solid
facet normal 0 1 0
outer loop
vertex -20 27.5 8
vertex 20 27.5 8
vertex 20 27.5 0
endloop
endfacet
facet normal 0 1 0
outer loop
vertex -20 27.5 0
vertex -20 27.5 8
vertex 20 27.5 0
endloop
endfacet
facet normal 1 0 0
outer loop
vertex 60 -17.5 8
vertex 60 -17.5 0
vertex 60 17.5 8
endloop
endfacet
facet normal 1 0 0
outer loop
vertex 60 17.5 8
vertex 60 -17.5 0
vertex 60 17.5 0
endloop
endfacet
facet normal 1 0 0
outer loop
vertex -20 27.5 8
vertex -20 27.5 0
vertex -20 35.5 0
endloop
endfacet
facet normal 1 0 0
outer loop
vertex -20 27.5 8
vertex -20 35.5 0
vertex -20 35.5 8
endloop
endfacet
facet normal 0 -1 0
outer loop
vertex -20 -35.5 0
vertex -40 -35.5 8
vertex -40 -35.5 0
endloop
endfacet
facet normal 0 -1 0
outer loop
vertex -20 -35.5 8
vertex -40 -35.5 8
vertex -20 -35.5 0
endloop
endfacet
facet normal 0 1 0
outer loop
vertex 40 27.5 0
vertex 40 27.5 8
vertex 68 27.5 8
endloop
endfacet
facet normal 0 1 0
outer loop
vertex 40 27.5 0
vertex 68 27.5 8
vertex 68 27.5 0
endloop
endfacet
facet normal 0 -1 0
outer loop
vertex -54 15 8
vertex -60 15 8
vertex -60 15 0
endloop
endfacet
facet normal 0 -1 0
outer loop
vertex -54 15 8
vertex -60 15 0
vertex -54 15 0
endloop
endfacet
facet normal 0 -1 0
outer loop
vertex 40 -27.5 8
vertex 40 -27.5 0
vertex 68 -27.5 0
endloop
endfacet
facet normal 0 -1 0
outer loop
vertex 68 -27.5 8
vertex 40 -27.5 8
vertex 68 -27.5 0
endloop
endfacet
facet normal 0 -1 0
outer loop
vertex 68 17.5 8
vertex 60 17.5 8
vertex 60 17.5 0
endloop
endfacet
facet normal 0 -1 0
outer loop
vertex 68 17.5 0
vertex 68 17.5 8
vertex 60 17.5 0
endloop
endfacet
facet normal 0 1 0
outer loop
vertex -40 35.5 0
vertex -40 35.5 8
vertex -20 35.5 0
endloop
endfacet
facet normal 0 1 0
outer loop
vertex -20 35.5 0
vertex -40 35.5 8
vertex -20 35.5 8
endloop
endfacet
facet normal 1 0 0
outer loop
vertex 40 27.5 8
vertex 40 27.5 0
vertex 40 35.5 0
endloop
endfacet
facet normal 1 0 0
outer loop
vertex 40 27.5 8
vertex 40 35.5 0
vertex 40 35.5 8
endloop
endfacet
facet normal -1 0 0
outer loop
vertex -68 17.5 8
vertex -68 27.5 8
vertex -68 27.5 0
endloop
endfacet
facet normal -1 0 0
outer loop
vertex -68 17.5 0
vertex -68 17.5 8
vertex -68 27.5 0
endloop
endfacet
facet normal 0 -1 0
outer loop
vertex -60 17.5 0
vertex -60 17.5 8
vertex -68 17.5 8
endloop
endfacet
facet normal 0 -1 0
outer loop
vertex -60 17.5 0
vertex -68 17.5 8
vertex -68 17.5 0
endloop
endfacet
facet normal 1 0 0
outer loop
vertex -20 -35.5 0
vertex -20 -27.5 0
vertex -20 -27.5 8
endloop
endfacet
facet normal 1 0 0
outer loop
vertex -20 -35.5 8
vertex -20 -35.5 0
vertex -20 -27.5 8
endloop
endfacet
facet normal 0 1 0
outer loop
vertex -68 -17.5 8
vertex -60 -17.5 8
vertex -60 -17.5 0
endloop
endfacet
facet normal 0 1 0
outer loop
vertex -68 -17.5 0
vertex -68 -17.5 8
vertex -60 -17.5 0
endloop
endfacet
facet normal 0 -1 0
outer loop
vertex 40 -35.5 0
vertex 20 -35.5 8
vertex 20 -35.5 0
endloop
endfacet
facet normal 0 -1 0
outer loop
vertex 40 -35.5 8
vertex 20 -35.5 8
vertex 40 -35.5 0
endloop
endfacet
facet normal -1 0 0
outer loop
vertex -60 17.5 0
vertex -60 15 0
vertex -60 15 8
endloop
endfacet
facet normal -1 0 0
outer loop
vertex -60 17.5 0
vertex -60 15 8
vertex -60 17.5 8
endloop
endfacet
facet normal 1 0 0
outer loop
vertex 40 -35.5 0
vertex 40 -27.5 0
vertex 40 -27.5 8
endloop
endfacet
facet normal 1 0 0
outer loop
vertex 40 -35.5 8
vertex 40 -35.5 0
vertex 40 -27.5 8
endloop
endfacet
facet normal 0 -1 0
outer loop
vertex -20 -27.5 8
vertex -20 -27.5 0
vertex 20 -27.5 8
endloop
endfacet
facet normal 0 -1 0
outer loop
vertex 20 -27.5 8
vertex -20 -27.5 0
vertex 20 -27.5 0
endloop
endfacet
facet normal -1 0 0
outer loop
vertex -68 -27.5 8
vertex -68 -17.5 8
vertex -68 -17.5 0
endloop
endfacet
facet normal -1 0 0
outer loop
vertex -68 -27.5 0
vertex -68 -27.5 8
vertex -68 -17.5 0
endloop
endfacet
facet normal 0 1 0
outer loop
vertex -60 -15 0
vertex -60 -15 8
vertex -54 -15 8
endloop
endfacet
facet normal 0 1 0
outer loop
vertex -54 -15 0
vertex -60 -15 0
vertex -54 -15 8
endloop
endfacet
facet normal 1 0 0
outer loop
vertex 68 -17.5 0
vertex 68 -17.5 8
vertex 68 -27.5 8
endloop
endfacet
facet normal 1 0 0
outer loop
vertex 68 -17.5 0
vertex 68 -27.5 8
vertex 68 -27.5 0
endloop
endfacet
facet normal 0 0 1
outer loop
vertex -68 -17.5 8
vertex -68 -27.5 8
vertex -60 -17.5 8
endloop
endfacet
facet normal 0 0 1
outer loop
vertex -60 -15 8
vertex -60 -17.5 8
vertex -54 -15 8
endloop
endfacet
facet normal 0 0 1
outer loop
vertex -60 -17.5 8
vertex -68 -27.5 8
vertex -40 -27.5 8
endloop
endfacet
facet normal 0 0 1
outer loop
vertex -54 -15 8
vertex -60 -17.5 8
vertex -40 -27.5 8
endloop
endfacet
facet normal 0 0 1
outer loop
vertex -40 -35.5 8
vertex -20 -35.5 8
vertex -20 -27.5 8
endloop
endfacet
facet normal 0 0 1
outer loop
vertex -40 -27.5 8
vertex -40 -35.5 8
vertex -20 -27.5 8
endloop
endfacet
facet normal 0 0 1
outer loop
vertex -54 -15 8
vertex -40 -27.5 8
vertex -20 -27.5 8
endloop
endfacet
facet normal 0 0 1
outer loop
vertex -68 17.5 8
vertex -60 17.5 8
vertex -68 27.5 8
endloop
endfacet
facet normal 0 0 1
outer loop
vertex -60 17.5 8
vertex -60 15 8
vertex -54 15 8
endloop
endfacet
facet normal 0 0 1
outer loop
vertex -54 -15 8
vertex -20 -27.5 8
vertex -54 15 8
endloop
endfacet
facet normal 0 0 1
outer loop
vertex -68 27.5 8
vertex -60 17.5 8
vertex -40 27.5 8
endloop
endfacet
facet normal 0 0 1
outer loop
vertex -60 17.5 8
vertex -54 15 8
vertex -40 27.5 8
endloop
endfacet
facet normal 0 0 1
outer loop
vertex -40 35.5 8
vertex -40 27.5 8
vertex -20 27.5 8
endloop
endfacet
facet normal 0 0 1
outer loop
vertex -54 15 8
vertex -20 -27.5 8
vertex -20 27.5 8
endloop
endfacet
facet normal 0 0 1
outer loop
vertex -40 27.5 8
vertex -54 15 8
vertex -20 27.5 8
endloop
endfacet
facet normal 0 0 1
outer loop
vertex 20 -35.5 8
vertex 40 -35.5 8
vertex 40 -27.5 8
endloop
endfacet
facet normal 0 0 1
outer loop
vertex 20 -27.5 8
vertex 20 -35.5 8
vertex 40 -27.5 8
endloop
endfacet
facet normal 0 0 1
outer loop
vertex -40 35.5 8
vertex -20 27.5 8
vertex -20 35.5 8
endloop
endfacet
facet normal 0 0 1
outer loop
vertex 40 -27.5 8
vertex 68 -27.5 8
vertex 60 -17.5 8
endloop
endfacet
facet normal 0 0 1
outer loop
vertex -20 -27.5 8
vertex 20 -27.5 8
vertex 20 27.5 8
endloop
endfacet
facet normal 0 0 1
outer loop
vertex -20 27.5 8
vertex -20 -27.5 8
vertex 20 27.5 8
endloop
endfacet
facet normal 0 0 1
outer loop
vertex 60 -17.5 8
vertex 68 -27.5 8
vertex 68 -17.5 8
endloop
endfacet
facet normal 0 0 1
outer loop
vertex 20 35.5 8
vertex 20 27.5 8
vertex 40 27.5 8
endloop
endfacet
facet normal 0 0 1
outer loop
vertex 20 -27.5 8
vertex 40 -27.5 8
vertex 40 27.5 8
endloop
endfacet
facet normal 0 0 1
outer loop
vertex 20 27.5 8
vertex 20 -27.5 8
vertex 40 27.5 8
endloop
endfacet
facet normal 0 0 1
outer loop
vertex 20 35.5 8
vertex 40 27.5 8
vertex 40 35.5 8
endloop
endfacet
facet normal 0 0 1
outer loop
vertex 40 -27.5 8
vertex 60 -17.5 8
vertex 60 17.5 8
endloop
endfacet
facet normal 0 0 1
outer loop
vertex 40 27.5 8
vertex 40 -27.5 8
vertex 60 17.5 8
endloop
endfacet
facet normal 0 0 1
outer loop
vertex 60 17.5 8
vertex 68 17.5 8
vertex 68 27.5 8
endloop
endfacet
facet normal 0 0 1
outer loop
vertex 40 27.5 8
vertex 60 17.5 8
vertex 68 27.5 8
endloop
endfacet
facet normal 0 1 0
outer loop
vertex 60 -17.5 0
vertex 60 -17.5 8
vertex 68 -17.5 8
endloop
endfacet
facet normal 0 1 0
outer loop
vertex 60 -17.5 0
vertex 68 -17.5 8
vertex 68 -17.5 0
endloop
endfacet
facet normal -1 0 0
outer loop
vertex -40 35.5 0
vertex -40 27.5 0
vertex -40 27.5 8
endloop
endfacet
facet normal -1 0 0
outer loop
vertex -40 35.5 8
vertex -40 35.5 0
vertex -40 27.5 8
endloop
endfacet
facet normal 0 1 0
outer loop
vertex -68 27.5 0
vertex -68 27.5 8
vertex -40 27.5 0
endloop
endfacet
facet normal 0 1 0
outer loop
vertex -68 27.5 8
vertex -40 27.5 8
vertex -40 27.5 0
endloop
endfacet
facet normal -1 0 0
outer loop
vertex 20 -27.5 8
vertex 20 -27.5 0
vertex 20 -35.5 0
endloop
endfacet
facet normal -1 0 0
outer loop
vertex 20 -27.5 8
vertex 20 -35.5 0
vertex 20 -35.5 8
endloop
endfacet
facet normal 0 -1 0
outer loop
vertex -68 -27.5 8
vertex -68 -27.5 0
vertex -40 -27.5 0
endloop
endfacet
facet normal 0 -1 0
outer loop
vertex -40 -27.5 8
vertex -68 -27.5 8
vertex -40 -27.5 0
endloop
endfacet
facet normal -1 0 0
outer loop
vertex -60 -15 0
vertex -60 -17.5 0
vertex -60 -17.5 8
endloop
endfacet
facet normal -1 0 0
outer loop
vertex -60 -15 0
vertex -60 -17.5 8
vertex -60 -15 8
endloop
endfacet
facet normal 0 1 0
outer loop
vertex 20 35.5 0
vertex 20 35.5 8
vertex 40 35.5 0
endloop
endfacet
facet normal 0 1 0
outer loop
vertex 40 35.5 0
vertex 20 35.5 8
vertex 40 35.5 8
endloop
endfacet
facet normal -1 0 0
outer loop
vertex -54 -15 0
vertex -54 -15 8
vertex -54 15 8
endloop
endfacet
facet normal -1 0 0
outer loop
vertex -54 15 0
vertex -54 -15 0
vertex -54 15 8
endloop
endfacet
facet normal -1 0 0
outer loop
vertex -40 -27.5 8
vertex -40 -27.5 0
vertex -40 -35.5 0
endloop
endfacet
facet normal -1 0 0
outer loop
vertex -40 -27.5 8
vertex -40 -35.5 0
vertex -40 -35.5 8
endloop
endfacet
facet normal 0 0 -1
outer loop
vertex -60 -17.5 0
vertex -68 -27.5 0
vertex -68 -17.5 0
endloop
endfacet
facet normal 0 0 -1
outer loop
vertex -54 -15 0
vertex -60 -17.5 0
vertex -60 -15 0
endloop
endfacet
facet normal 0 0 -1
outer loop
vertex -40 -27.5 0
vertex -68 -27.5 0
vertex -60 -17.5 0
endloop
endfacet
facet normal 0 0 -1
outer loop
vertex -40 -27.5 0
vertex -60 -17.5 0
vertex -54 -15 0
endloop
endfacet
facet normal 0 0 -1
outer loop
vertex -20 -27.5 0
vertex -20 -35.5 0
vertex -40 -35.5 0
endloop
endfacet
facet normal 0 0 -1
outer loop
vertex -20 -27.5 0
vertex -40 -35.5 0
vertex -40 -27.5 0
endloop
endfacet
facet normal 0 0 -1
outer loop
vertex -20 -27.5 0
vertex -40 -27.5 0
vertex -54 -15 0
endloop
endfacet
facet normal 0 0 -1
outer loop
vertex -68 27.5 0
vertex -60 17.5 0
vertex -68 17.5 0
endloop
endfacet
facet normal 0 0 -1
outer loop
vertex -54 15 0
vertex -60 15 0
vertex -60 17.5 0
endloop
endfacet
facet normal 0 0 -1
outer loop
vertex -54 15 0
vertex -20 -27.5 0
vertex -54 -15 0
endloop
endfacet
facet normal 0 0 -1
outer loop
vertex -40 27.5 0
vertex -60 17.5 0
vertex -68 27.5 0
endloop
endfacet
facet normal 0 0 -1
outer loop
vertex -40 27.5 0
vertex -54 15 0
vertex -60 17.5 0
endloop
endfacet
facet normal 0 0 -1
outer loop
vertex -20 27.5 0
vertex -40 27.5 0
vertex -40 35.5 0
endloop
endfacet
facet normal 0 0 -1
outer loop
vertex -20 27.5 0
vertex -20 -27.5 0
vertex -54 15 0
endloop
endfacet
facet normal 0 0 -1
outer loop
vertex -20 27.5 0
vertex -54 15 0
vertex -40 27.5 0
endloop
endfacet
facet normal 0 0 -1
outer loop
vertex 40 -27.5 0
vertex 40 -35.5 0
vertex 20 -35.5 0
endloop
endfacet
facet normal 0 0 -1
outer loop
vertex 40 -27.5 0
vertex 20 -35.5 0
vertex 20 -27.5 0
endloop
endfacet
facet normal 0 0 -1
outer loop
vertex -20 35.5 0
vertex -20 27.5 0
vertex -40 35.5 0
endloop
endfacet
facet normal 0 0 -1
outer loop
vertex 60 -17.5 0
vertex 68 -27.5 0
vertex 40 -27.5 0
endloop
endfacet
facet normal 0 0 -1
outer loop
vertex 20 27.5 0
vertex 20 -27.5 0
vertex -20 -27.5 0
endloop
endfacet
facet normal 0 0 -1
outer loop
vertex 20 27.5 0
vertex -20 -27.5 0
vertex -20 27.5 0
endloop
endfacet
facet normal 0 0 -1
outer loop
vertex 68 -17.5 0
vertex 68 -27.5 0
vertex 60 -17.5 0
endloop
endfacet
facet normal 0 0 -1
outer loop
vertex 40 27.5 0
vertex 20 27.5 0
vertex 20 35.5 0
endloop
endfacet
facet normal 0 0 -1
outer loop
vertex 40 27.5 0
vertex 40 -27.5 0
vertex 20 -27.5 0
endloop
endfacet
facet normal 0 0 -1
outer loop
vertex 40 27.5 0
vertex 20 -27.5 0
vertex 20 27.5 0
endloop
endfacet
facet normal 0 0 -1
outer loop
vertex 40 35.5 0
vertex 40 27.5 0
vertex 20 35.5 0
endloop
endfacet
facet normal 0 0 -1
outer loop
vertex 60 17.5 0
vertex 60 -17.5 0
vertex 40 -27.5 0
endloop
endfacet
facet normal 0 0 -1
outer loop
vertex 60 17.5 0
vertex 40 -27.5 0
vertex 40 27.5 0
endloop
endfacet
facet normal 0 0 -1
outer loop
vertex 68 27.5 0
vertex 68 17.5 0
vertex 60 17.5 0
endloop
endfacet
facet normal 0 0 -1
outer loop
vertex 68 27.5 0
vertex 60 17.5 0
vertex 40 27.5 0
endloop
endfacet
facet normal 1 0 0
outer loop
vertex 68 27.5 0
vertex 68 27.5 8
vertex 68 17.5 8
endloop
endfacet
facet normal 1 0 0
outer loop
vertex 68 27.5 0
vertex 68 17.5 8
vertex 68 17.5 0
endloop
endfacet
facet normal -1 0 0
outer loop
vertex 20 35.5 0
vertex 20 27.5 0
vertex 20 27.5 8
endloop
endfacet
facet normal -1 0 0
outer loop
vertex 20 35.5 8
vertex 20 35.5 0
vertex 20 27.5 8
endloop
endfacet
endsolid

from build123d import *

# Parameters (mm, degrees)
SKETCH1_W           = 120
SKETCH1_H           = 55
BOSS_EXTRUDE1_DEPTH = 8
CUT_EXTRUDE1_REACH  = 68.485
SKETCH2_W           = 38.750815327
SKETCH2_H           = 30
SKETCH4_W           = 8
SKETCH4_H           = 10
BOSS_EXTRUDE3_DEPTH = 8
SKETCH6_W           = 20
SKETCH6_H           = 8
BOSS_EXTRUDE4_DEPTH = 8


with BuildPart() as part:
    # Sketch1 → Boss-Extrude1 (new body)
    with BuildSketch(Plane.XY):
        Rectangle(SKETCH1_W, SKETCH1_H)
    extrude(amount=BOSS_EXTRUDE1_DEPTH)

    # Sketch2 → Cut-Extrude1 (cut, up to next)
    with BuildSketch(Plane.XY.offset(8), mode=Mode.PRIVATE) as cut_extrude1_sk1:
        with Locations((-73.375407663, 0)):
            Rectangle(SKETCH2_W, SKETCH2_H)
    cut_extrude1_tool1 = extrude(cut_extrude1_sk1.sketch, amount=-CUT_EXTRUDE1_REACH, mode=Mode.PRIVATE) & part.part
    add(cut_extrude1_tool1.solids().sort_by_distance((-73.375408, 0, 8))[0], mode=Mode.SUBTRACT)

    # Sketch4 → Boss-Extrude3 (add)
    with BuildSketch(Plane(origin=(60, 0, 0), x_dir=(0, 0, -1), z_dir=(1, 0, 0))):
        with Locations((-4, 22.5)):
            Rectangle(SKETCH4_W, SKETCH4_H)
        with Locations((-4, -22.5)):
            Rectangle(SKETCH4_W, SKETCH4_H)
    boss_extrude3 = extrude(amount=BOSS_EXTRUDE3_DEPTH)

    # Sketch6 → Boss-Extrude4 (add)
    with BuildSketch(Plane.XZ.offset(27.5)):
        with Locations((-30, 4)):
            Rectangle(SKETCH6_W, SKETCH6_H)
        with Locations((30, 4)):
            Rectangle(SKETCH6_W, SKETCH6_H)
    boss_extrude4 = extrude(amount=BOSS_EXTRUDE4_DEPTH)

    # Mirror2: Boss-Extrude4 across plane
    add(boss_extrude4.mirror(Plane(origin=(0, 0, 0), x_dir=(0, 0, 1), z_dir=(0, -1, 0))))

    # Mirror3: Boss-Extrude3 across plane
    add(boss_extrude3.mirror(Plane.ZY))


solid = part.part
